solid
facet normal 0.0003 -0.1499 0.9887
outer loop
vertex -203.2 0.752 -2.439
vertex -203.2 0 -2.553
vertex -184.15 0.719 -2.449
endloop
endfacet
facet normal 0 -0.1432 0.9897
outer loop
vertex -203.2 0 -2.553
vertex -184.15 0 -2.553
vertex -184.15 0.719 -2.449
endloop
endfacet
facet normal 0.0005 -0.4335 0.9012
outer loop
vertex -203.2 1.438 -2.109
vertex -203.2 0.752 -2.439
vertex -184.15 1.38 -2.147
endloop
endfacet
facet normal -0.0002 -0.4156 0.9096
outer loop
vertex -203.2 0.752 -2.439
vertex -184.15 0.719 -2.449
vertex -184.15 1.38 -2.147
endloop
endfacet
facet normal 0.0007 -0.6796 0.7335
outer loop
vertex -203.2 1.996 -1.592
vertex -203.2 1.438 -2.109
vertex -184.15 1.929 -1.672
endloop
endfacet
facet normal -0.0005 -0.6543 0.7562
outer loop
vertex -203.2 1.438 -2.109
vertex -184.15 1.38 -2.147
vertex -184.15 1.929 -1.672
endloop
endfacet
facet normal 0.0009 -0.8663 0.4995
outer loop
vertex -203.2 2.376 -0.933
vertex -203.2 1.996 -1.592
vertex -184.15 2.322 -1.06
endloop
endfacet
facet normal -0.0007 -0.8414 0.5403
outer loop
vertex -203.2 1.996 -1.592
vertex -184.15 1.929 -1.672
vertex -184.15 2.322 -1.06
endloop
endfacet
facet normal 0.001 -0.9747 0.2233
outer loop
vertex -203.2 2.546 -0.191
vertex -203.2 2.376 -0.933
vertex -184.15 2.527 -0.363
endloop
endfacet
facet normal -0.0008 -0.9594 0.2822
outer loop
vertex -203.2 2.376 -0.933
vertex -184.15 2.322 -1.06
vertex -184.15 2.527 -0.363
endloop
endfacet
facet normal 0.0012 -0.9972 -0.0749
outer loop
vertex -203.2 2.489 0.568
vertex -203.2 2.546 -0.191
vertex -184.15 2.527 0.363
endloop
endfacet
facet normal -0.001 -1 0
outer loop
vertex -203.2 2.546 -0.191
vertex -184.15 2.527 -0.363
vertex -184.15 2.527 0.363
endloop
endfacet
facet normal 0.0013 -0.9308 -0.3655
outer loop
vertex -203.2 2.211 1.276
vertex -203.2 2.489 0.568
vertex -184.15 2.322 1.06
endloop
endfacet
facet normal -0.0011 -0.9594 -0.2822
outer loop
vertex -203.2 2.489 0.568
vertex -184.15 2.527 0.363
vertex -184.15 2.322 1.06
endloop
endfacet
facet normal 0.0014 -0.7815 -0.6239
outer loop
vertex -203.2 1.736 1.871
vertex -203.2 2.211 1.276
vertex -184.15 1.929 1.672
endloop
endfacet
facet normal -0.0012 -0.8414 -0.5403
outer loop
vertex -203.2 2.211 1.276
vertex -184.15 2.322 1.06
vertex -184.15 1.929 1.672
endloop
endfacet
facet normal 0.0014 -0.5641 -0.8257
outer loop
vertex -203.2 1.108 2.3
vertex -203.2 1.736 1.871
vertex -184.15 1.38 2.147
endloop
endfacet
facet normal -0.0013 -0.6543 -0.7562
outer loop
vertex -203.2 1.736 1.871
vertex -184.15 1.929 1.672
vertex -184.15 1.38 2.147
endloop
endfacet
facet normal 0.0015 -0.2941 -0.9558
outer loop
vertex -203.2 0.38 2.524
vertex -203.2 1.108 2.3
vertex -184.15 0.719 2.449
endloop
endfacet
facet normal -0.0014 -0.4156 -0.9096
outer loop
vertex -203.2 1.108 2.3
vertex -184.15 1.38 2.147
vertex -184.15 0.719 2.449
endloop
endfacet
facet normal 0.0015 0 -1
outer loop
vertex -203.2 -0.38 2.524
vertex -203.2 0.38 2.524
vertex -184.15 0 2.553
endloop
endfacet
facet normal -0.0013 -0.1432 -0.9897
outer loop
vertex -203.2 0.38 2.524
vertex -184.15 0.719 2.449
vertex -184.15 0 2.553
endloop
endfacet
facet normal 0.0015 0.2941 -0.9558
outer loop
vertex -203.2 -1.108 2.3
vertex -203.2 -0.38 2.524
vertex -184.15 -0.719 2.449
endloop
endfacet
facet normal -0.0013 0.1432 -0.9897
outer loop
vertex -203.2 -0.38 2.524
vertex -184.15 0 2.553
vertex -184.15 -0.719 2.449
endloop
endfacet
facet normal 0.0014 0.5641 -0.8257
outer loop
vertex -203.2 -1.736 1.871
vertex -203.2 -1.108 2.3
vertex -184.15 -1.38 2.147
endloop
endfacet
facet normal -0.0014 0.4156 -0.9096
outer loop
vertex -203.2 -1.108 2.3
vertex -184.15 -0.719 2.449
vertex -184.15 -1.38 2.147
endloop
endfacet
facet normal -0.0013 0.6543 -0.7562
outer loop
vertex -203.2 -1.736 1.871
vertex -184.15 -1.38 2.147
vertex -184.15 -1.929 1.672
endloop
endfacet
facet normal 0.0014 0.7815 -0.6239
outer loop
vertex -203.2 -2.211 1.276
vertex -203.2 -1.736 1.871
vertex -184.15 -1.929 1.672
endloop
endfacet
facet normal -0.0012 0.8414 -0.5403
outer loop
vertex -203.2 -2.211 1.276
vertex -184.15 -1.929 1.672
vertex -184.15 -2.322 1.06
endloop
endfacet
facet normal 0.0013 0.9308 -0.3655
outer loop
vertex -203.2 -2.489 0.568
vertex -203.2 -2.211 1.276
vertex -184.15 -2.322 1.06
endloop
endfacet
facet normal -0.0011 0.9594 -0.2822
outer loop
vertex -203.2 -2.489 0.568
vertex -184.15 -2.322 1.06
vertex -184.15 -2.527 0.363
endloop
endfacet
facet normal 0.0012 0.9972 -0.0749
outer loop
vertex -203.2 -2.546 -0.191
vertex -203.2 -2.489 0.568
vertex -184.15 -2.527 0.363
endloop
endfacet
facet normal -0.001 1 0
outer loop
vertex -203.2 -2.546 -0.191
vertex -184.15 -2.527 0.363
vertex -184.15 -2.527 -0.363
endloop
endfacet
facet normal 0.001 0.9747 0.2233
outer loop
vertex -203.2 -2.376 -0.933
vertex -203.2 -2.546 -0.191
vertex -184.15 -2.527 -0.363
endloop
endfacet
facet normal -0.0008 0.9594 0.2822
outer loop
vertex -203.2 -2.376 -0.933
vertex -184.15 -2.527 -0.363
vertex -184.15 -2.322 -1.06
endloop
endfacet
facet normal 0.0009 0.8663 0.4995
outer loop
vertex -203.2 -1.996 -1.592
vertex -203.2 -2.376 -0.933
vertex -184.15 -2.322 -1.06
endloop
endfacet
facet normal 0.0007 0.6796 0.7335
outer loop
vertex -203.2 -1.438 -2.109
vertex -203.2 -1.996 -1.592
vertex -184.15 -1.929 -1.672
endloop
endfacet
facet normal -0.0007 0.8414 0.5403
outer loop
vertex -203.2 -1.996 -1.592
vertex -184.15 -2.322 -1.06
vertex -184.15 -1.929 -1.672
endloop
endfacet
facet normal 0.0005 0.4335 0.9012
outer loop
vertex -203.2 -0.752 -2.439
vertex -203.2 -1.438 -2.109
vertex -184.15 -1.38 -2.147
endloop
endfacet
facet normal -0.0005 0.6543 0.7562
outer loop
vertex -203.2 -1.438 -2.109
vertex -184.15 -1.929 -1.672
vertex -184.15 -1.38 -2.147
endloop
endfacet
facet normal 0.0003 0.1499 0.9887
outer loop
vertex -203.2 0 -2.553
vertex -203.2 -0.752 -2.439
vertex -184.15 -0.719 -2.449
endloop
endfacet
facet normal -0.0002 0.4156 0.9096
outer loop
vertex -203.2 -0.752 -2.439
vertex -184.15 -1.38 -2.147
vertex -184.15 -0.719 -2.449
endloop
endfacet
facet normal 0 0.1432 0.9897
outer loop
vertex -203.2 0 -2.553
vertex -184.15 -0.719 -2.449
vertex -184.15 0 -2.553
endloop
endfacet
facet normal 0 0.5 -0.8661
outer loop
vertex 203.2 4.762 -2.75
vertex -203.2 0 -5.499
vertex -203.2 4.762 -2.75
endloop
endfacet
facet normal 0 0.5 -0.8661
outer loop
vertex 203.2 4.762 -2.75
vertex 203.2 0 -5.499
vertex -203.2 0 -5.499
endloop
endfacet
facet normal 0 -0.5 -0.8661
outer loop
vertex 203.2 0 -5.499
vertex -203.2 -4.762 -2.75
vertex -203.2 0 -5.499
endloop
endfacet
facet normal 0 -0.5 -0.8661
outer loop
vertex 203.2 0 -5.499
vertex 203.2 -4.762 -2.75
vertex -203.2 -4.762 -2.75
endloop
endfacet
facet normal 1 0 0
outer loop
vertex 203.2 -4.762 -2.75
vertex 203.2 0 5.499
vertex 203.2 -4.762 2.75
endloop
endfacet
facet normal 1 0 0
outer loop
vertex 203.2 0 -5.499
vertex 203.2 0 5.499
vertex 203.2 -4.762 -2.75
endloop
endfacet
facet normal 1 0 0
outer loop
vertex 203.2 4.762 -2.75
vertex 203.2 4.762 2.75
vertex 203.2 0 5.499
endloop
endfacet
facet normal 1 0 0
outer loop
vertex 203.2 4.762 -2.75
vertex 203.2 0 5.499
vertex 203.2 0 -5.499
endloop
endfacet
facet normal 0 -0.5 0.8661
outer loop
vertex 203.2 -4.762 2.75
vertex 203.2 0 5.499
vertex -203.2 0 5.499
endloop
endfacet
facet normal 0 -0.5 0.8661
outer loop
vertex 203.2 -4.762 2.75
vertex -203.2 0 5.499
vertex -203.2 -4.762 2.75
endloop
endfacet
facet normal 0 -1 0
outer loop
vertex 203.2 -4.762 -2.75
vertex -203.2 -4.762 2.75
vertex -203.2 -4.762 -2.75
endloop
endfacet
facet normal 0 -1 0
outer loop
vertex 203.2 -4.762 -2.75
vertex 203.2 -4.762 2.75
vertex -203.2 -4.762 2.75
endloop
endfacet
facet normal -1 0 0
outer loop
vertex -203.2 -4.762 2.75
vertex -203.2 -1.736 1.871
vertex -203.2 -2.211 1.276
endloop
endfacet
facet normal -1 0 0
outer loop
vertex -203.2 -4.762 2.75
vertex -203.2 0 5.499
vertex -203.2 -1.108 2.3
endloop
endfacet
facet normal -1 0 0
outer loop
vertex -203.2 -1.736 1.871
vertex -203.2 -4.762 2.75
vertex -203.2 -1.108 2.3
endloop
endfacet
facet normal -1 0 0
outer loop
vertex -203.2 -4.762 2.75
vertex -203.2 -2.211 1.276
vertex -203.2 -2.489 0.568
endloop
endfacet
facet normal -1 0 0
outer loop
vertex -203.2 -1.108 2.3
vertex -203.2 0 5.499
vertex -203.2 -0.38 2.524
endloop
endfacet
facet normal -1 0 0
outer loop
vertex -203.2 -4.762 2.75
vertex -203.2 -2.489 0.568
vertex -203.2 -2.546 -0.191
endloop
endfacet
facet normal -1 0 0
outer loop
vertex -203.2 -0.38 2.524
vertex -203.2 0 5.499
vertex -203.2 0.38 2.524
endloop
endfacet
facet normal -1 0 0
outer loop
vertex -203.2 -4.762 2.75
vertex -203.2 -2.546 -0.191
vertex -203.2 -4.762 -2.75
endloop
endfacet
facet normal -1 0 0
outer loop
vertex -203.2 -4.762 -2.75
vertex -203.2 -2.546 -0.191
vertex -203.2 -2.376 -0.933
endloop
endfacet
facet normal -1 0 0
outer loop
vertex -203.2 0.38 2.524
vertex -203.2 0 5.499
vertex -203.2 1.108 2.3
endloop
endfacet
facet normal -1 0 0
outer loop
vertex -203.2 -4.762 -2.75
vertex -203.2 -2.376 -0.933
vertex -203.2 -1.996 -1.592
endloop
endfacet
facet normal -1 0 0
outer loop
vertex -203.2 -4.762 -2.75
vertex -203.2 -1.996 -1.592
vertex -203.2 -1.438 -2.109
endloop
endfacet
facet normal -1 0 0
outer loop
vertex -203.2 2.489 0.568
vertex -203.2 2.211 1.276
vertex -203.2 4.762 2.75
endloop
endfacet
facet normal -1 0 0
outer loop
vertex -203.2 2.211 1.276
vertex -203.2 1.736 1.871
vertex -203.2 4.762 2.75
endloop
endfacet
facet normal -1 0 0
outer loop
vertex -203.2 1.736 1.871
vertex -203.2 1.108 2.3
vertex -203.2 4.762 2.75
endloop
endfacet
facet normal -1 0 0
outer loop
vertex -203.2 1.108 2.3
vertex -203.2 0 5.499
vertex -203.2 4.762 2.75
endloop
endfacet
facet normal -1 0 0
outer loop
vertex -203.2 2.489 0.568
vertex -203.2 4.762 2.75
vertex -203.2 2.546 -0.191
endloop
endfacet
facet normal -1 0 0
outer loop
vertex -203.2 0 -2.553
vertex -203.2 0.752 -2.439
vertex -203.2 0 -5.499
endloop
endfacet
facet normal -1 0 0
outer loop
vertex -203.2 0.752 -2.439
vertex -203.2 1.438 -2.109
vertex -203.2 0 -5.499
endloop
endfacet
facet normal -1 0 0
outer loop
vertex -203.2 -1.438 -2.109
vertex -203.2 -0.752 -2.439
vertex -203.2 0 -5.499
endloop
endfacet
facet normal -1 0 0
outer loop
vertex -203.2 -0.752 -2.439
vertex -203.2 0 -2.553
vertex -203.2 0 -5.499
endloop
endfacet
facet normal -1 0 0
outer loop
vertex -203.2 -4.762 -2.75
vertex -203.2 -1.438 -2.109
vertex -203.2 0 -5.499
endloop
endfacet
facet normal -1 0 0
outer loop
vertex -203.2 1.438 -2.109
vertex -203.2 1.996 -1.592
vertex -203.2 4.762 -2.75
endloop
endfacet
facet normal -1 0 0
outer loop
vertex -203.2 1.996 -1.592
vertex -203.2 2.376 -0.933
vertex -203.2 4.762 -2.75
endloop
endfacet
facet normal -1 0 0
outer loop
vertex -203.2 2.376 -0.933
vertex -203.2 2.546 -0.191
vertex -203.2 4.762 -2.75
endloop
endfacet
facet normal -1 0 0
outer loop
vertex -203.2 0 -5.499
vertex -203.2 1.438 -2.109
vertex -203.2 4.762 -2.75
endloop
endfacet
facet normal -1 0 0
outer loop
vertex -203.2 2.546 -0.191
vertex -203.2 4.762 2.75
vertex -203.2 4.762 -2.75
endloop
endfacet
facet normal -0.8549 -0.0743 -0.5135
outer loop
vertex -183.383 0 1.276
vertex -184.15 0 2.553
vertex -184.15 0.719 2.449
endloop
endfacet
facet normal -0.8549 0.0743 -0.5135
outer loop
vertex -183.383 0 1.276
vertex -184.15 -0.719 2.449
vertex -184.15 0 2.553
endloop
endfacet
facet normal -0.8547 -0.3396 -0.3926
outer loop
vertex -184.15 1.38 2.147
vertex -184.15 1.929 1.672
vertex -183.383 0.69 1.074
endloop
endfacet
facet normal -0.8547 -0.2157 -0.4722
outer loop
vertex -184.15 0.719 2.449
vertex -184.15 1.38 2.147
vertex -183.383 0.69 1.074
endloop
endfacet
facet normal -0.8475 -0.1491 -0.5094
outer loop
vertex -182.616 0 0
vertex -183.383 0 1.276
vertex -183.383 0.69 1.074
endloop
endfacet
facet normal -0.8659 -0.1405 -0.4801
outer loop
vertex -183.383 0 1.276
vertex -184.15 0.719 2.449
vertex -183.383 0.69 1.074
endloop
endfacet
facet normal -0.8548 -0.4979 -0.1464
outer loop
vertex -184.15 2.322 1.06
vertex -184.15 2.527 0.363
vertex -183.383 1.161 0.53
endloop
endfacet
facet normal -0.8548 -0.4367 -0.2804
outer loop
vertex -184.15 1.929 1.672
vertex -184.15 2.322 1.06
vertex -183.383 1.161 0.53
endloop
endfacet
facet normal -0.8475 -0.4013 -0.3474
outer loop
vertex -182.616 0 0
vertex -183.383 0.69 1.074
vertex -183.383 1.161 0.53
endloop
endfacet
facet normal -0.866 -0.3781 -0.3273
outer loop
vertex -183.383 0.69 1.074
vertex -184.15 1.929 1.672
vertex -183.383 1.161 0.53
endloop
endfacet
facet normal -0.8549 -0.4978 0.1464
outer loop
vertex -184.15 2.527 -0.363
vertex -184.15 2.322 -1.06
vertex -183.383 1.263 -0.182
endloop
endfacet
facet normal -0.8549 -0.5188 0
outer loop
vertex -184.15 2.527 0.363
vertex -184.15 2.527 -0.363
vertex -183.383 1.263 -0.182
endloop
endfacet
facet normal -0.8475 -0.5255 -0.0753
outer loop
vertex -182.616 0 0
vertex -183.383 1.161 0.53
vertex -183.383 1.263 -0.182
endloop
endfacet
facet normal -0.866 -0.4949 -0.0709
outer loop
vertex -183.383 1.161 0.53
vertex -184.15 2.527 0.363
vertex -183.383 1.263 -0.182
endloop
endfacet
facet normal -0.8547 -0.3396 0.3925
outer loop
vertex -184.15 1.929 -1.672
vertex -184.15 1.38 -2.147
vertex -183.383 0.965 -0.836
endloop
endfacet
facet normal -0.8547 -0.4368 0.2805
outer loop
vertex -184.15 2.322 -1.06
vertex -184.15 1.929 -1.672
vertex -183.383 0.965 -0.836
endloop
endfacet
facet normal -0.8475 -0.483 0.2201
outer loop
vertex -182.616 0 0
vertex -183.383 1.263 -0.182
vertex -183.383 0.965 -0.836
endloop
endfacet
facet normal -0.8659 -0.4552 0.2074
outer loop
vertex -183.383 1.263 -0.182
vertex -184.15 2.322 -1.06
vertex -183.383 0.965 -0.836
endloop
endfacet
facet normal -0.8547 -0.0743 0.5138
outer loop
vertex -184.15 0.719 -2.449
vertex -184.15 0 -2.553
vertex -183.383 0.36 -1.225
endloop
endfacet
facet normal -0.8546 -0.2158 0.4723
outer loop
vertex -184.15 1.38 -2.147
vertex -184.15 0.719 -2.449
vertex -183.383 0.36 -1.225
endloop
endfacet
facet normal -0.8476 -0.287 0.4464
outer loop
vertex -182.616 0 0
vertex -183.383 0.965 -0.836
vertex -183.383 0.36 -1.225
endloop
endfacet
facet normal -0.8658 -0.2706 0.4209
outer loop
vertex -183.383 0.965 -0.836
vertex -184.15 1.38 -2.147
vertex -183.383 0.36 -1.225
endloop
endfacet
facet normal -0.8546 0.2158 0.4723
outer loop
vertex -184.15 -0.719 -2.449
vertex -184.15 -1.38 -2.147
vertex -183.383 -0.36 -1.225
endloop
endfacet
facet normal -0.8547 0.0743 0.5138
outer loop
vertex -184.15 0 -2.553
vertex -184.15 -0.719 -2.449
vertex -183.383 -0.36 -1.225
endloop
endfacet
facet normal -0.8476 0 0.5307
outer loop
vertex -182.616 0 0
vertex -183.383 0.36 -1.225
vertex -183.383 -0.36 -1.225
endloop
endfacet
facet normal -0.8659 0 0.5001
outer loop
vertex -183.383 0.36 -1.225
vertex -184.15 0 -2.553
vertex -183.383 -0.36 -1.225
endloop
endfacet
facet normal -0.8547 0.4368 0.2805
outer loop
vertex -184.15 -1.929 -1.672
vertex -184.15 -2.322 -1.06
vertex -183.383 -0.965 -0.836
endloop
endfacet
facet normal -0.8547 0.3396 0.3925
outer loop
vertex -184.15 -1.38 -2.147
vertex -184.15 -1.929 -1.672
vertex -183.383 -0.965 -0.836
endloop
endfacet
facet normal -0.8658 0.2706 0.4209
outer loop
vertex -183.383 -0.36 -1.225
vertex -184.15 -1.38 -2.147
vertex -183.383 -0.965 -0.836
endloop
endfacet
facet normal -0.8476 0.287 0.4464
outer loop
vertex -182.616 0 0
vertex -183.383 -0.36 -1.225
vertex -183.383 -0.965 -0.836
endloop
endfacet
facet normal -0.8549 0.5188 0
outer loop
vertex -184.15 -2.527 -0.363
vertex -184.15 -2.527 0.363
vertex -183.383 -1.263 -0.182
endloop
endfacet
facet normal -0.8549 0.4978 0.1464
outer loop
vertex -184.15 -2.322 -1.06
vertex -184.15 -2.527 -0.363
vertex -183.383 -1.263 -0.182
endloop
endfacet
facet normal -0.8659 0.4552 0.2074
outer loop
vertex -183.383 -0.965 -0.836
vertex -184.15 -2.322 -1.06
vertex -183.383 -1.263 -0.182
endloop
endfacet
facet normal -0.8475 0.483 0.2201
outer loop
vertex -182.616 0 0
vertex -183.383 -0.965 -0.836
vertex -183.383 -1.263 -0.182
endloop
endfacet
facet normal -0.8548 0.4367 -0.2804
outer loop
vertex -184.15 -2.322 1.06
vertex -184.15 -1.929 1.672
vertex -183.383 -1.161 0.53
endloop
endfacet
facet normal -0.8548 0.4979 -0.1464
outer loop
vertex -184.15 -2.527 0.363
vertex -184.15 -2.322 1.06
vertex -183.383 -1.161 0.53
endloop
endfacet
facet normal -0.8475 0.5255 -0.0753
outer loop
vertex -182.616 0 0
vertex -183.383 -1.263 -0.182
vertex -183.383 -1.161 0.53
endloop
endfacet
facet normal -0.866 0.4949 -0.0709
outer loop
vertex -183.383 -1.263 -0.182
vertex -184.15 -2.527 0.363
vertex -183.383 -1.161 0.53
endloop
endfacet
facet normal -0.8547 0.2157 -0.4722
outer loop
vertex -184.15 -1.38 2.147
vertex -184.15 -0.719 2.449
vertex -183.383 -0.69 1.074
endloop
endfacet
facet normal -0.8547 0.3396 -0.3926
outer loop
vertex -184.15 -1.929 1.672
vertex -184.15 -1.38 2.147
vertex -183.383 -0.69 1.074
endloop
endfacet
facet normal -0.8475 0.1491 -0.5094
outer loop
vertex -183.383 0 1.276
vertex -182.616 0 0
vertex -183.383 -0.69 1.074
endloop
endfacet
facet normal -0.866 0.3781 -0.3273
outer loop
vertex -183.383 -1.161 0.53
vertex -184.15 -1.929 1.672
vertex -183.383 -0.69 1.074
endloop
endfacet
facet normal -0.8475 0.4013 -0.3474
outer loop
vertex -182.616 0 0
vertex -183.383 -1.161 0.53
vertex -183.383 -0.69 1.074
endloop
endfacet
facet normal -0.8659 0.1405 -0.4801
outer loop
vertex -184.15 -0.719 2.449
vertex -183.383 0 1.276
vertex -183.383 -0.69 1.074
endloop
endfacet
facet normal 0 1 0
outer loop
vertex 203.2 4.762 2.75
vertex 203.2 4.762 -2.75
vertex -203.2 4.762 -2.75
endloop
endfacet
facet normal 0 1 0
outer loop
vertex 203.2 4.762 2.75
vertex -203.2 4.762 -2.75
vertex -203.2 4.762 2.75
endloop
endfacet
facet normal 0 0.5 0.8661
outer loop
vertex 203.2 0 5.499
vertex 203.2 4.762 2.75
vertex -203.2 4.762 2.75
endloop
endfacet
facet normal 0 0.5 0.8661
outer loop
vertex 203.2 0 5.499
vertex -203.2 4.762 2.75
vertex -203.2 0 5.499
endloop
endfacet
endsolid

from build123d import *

# Parameters (mm, degrees)
BOSS_EXTRUDE1_DEPTH         = 203.2
F_1_4_20_TAPPED_HOLE1_D     = 5.1054
F_1_4_20_TAPPED_HOLE1_DEPTH = 19.05
F_1_4_20_TAPPED_HOLE1_TIP   = 1.533816902


with BuildPart() as part:
    # Sketch1 → Boss-Extrude1 (new, symmetric)
    with BuildSketch(Plane(origin=(0, 0, 0), x_dir=(0, 0, -1), z_dir=(1, 0, 0))):
        Polygon((5.499261314, 0), (2.749630657, 4.7625), (-2.749630657, 4.7625), (-5.499261314, 0), (-2.749630657, -4.7625), (2.749630657, -4.7625), align=None)
    extrude(amount=BOSS_EXTRUDE1_DEPTH, both=True)

    # 1/4-20 Tapped Hole1
    with Locations(Plane.ZY.offset(203.2)):
        with Locations((0, 0)):
            Hole(F_1_4_20_TAPPED_HOLE1_D / 2, depth=F_1_4_20_TAPPED_HOLE1_DEPTH)
            with Locations((0, 0, -(F_1_4_20_TAPPED_HOLE1_DEPTH + F_1_4_20_TAPPED_HOLE1_TIP / 2))):  # 118° drill point
                Cone(0, F_1_4_20_TAPPED_HOLE1_D / 2, F_1_4_20_TAPPED_HOLE1_TIP, mode=Mode.SUBTRACT)


solid = part.part
